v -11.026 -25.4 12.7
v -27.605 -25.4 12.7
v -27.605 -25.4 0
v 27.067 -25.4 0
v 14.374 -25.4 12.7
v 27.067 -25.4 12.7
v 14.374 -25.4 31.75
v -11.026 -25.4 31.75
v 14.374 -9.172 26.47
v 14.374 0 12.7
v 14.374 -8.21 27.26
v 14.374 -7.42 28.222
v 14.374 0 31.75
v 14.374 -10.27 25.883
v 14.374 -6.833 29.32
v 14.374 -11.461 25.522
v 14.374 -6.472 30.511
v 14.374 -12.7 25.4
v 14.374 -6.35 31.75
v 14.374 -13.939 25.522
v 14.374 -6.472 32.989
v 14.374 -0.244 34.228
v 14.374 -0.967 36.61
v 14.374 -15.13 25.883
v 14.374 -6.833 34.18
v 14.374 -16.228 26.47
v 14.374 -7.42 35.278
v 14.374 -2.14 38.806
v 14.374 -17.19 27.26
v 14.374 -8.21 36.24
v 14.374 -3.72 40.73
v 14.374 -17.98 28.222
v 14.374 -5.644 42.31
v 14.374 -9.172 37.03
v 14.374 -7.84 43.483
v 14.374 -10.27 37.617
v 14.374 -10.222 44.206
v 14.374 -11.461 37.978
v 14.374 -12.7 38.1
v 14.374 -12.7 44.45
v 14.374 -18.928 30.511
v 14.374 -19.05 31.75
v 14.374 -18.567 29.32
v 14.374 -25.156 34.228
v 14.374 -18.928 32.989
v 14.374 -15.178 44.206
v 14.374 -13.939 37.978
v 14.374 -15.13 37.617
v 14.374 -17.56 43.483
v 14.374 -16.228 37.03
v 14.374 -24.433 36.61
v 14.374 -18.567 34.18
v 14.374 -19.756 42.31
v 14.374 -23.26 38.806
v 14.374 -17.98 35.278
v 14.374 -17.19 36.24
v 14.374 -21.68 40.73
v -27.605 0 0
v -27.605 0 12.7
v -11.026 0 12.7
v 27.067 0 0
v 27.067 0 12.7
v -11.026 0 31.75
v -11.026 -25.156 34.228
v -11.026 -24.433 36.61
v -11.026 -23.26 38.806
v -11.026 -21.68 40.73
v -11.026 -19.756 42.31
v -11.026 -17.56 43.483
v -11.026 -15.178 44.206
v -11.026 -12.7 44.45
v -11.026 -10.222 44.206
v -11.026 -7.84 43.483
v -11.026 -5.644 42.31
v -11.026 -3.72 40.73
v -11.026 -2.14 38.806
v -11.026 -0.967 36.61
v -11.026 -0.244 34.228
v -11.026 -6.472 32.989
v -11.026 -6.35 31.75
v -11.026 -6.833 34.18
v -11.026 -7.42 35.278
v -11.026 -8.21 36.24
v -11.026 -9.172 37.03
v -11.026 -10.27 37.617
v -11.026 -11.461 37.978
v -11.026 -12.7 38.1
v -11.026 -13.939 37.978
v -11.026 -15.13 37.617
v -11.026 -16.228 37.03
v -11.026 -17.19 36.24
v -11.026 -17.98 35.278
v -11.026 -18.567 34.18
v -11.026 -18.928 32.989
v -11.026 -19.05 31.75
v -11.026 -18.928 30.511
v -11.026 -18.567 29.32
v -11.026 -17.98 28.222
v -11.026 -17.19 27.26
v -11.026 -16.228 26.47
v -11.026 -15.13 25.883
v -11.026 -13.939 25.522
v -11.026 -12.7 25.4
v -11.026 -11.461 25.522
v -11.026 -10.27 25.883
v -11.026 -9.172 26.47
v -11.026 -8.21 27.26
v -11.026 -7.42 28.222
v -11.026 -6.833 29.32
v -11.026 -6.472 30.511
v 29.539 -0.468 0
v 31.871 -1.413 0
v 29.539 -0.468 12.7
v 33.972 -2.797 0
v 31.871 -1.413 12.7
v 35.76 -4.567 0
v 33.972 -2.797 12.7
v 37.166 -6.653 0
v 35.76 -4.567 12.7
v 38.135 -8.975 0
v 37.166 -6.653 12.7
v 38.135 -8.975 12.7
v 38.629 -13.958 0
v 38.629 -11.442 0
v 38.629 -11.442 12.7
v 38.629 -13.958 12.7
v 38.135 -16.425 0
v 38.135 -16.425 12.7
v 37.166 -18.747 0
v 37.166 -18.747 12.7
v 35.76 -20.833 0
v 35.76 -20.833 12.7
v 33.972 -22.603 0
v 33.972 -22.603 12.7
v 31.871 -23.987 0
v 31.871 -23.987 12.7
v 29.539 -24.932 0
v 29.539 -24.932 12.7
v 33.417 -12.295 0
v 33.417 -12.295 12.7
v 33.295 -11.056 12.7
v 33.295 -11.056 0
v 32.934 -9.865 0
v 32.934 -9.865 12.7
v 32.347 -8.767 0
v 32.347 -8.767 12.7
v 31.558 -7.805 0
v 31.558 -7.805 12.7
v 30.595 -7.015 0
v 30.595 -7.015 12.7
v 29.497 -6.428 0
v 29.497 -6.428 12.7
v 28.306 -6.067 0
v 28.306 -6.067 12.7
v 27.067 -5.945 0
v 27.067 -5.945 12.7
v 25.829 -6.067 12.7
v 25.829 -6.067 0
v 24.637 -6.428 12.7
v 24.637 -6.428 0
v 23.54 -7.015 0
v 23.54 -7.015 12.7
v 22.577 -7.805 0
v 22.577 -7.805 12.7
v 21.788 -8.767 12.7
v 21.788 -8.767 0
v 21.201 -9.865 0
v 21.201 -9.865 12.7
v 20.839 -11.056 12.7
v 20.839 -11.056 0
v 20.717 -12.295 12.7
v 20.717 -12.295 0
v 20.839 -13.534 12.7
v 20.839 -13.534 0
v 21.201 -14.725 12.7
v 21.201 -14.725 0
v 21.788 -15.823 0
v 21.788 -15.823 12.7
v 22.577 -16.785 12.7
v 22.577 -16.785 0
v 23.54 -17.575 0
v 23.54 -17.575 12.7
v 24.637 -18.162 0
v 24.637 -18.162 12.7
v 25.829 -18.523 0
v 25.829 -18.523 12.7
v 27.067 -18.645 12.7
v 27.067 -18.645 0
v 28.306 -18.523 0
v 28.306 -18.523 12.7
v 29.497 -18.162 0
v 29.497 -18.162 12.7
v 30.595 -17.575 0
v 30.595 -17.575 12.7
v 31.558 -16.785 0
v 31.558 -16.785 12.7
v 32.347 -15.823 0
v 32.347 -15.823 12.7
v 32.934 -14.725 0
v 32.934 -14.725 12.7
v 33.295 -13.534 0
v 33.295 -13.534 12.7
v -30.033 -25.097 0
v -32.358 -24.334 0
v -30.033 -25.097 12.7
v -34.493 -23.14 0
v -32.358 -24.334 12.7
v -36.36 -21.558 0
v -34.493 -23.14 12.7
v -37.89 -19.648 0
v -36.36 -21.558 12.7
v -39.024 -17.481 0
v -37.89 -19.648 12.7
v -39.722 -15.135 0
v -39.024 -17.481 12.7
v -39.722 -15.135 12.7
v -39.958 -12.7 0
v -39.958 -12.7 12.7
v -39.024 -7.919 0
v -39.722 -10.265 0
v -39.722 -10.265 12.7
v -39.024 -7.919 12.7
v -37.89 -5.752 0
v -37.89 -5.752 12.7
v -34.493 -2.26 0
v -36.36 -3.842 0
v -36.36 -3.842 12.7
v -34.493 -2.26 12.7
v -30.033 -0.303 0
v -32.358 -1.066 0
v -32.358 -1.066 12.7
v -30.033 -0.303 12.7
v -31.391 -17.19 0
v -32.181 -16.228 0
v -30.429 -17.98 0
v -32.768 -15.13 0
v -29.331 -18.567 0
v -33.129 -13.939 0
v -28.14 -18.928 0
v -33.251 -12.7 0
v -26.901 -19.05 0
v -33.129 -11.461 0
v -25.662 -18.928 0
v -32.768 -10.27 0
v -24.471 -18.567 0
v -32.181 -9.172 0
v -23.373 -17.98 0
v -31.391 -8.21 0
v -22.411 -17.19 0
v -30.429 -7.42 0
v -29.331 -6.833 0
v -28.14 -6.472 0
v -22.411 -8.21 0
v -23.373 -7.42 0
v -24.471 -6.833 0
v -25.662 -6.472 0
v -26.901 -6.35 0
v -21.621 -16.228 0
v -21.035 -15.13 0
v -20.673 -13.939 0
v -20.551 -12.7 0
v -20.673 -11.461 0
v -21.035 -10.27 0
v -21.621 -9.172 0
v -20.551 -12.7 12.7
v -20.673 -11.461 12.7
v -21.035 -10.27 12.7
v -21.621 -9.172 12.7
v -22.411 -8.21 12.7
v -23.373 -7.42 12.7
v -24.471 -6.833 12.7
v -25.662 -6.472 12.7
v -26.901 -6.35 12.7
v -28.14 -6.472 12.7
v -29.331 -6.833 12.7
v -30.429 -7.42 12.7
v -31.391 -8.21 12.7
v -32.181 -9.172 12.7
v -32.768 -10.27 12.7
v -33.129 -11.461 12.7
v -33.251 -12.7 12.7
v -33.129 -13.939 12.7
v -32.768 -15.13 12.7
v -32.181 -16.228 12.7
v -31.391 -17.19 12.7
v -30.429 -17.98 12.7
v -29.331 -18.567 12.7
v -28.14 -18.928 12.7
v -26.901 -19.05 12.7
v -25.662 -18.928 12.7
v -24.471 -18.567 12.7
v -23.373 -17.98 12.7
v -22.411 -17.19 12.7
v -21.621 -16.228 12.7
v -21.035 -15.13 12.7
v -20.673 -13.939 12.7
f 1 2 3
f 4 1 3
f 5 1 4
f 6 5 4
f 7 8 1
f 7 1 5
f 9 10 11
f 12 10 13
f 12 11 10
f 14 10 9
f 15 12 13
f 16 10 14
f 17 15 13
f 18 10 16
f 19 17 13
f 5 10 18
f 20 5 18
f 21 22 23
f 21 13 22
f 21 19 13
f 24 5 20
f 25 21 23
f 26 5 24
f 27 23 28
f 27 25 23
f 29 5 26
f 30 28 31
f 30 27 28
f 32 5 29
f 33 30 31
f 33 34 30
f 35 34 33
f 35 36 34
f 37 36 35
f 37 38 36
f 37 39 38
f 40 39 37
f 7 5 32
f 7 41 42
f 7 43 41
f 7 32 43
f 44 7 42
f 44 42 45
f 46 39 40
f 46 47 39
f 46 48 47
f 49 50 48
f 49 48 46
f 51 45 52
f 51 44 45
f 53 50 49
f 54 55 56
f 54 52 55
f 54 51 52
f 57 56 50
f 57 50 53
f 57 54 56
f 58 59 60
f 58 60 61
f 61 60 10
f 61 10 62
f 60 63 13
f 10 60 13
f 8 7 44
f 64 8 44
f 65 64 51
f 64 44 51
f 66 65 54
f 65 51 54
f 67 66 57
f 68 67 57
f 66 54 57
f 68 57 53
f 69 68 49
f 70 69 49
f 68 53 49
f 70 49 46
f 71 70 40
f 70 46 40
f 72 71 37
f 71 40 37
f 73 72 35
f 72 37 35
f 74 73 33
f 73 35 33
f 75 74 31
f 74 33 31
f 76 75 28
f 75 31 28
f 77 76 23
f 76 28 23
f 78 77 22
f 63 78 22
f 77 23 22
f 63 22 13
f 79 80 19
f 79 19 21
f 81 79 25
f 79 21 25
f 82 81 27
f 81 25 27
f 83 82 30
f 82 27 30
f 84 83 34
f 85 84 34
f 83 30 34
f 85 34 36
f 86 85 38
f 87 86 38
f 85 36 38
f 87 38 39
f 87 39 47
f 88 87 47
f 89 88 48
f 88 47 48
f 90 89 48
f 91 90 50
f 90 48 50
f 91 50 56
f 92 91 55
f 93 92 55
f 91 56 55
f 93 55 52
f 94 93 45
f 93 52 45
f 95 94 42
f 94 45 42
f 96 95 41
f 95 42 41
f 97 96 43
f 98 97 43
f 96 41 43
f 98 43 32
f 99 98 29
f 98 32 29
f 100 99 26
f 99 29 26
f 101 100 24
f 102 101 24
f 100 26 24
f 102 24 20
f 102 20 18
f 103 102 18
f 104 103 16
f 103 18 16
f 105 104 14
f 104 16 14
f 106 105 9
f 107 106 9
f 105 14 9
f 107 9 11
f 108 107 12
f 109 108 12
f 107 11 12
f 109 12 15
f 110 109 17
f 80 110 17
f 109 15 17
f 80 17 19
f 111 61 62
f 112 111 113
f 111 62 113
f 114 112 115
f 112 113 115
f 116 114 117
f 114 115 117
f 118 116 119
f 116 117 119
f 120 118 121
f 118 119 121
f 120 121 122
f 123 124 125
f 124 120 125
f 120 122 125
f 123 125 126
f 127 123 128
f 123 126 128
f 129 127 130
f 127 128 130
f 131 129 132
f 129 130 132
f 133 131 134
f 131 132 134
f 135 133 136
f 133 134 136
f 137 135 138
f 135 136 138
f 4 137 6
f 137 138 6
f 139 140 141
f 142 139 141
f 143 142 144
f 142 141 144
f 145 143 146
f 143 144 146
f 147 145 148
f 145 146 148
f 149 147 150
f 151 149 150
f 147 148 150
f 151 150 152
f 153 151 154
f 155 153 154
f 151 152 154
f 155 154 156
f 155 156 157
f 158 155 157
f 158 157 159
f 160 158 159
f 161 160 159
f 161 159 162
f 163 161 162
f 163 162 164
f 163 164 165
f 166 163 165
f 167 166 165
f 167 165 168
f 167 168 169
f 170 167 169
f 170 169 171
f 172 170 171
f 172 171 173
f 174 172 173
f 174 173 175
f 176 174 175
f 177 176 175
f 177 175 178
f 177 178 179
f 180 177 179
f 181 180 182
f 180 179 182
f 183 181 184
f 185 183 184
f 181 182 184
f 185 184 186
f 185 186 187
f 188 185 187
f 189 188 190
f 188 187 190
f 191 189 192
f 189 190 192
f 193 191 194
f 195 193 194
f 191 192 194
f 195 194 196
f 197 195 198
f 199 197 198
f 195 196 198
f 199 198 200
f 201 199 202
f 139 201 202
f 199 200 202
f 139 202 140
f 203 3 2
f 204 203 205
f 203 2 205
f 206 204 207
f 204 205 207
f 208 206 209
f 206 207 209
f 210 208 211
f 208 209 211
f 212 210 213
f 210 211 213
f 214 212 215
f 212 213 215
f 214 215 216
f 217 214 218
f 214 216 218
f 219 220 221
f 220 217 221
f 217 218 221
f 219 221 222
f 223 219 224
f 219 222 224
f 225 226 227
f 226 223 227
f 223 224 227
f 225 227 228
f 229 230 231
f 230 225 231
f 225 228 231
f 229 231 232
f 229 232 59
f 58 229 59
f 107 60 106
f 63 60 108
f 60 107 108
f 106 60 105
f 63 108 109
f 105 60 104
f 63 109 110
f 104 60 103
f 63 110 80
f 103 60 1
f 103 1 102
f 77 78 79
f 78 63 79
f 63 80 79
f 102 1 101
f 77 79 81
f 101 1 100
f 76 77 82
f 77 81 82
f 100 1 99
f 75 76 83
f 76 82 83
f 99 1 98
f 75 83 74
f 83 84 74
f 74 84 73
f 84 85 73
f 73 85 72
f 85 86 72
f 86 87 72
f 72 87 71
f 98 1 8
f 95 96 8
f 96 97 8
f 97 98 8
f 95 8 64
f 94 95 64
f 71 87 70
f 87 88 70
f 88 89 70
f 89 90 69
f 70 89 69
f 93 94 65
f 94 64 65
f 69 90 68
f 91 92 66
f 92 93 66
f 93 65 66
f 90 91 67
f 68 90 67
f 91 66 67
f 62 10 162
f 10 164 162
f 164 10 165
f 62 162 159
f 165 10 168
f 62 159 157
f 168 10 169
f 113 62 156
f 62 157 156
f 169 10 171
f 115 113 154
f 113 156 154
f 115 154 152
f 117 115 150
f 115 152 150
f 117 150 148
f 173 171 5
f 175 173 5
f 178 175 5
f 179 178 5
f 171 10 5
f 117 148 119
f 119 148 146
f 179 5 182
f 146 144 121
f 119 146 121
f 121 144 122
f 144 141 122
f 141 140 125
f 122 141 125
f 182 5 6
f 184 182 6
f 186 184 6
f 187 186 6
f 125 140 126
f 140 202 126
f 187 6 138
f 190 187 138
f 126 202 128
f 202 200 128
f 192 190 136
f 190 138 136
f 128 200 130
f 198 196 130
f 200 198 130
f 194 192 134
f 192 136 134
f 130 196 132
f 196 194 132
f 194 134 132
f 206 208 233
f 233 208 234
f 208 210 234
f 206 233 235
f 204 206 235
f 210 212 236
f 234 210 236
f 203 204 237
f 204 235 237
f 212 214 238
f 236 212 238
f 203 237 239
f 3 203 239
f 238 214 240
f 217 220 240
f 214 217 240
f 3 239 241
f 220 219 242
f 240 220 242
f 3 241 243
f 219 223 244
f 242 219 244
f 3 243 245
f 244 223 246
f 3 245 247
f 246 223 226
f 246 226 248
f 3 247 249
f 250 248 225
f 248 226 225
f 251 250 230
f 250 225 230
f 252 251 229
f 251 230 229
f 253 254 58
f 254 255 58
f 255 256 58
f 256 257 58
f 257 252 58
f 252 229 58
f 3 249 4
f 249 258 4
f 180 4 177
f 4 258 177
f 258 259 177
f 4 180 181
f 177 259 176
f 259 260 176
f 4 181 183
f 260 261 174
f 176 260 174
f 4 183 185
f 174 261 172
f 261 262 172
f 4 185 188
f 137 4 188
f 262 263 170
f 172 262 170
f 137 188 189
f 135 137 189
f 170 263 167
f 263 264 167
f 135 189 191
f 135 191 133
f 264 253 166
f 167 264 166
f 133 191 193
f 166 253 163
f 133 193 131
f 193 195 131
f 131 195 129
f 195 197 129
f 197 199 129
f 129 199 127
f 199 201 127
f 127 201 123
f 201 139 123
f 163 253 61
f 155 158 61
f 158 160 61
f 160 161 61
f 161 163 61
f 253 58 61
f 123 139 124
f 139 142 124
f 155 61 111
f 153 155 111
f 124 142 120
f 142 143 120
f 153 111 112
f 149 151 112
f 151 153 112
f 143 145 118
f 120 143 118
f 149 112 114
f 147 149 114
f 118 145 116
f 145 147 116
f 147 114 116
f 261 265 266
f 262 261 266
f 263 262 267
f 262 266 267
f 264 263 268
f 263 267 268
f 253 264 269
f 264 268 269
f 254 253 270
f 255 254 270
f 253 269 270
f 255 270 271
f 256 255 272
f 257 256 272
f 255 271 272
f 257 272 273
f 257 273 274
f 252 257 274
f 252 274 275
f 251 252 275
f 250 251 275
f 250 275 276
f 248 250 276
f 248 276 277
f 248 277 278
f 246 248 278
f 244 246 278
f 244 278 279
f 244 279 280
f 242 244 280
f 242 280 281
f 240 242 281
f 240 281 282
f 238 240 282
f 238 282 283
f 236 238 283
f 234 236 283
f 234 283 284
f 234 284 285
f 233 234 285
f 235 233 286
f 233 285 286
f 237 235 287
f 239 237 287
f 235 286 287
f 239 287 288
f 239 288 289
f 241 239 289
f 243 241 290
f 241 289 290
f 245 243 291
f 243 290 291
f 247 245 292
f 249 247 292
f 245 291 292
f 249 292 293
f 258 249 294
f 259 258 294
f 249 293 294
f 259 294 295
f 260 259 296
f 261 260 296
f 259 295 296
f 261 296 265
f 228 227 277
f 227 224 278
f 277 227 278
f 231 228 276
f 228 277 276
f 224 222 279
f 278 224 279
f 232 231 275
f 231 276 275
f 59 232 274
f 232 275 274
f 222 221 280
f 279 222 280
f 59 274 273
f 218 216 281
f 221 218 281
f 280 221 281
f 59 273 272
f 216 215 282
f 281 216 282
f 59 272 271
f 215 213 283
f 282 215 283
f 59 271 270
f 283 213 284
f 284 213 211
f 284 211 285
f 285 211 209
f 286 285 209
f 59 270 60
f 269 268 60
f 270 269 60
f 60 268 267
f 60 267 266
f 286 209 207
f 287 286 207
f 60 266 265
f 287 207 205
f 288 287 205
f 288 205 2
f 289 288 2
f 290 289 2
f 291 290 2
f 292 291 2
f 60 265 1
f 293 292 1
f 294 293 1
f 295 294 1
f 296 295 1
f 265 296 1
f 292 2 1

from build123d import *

# Parameters (mm, degrees)
F0_W     = 88.9
F0_H     = 63.5
F1_DEPTH = 25.4
F2_W     = 31.75
F2_H     = 50.8
F3_DEPTH = 25.4
F4_R     = 6.35
F5_DEPTH = 25.4
F6_R     = 6.35
F7_DEPTH = 25.4
F8_R     = 6.35
F9_DEPTH = 25.4


with BuildPart() as f1:
    # F0 (on Front) → F1 (new body)
    with BuildSketch(Plane.XZ):
        with Locations((1.6738499718, 31.75)):
            Rectangle(F0_W, F0_H)
    extrude(amount=F1_DEPTH)

    # F2 (on face) → F3 (cut)
    with BuildSketch(Plane.XZ.offset(25.4)):
        with Locations((-26.9011500282, 38.1)):
            Rectangle(F2_W, F2_H)
        with Locations((30.2488499718, 38.1)):
            Rectangle(F2_W, F2_H)
    extrude(amount=-F3_DEPTH, mode=Mode.SUBTRACT)

    # F4 (on face) → F5 (cut)
    with BuildSketch(Plane.YZ.offset(14.3738499718)):
        with BuildLine():
            ThreePointArc((-25.4, 31.75), (-12.7, 44.45), (0, 31.75))
            Line((0, 31.75), (0, 63.5))
            Line((0, 63.5), (-25.4, 63.5))
            Line((-25.4, 63.5), (-25.4, 31.75))
        make_face()
        with Locations((-12.7, 31.75)):
            Circle(F4_R)
    extrude(amount=-F5_DEPTH, mode=Mode.SUBTRACT)

    # F6 (on face) → F7 (cut)
    with BuildSketch(Plane.XY.offset(12.7)):
        with Locations((27.0673923413, -12.2950529623)):
            Circle(F6_R)
        with BuildLine():
            ThreePointArc((27.0673923413, 0), (38.6908388043, -12.7), (27.0673923413, -25.4))
            Line((27.0673923413, -25.4), (46.1238499718, -25.4))
            Line((46.1238499718, -25.4), (46.1238499718, 0))
            Line((46.1238499718, 0), (27.0673923413, 0))
        make_face()
    extrude(amount=-F7_DEPTH, mode=Mode.SUBTRACT)

    # F8 (on face) → F9 (cut)
    with BuildSketch(Plane.XY.offset(12.7)):
        with Locations((-26.9011500282, -12.7)):
            Circle(F8_R)
        with BuildLine():
            ThreePointArc((-27.6049521663, -25.4), (-39.9579255304, -12.7), (-27.6049521663, 0))
            Line((-27.6049521663, 0), (-42.7761500282, 0))
            Line((-42.7761500282, 0), (-42.7761500282, -25.4))
            Line((-42.7761500282, -25.4), (-27.6049521663, -25.4))
        make_face()
    extrude(amount=-F9_DEPTH, mode=Mode.SUBTRACT)


solid = f1.part
